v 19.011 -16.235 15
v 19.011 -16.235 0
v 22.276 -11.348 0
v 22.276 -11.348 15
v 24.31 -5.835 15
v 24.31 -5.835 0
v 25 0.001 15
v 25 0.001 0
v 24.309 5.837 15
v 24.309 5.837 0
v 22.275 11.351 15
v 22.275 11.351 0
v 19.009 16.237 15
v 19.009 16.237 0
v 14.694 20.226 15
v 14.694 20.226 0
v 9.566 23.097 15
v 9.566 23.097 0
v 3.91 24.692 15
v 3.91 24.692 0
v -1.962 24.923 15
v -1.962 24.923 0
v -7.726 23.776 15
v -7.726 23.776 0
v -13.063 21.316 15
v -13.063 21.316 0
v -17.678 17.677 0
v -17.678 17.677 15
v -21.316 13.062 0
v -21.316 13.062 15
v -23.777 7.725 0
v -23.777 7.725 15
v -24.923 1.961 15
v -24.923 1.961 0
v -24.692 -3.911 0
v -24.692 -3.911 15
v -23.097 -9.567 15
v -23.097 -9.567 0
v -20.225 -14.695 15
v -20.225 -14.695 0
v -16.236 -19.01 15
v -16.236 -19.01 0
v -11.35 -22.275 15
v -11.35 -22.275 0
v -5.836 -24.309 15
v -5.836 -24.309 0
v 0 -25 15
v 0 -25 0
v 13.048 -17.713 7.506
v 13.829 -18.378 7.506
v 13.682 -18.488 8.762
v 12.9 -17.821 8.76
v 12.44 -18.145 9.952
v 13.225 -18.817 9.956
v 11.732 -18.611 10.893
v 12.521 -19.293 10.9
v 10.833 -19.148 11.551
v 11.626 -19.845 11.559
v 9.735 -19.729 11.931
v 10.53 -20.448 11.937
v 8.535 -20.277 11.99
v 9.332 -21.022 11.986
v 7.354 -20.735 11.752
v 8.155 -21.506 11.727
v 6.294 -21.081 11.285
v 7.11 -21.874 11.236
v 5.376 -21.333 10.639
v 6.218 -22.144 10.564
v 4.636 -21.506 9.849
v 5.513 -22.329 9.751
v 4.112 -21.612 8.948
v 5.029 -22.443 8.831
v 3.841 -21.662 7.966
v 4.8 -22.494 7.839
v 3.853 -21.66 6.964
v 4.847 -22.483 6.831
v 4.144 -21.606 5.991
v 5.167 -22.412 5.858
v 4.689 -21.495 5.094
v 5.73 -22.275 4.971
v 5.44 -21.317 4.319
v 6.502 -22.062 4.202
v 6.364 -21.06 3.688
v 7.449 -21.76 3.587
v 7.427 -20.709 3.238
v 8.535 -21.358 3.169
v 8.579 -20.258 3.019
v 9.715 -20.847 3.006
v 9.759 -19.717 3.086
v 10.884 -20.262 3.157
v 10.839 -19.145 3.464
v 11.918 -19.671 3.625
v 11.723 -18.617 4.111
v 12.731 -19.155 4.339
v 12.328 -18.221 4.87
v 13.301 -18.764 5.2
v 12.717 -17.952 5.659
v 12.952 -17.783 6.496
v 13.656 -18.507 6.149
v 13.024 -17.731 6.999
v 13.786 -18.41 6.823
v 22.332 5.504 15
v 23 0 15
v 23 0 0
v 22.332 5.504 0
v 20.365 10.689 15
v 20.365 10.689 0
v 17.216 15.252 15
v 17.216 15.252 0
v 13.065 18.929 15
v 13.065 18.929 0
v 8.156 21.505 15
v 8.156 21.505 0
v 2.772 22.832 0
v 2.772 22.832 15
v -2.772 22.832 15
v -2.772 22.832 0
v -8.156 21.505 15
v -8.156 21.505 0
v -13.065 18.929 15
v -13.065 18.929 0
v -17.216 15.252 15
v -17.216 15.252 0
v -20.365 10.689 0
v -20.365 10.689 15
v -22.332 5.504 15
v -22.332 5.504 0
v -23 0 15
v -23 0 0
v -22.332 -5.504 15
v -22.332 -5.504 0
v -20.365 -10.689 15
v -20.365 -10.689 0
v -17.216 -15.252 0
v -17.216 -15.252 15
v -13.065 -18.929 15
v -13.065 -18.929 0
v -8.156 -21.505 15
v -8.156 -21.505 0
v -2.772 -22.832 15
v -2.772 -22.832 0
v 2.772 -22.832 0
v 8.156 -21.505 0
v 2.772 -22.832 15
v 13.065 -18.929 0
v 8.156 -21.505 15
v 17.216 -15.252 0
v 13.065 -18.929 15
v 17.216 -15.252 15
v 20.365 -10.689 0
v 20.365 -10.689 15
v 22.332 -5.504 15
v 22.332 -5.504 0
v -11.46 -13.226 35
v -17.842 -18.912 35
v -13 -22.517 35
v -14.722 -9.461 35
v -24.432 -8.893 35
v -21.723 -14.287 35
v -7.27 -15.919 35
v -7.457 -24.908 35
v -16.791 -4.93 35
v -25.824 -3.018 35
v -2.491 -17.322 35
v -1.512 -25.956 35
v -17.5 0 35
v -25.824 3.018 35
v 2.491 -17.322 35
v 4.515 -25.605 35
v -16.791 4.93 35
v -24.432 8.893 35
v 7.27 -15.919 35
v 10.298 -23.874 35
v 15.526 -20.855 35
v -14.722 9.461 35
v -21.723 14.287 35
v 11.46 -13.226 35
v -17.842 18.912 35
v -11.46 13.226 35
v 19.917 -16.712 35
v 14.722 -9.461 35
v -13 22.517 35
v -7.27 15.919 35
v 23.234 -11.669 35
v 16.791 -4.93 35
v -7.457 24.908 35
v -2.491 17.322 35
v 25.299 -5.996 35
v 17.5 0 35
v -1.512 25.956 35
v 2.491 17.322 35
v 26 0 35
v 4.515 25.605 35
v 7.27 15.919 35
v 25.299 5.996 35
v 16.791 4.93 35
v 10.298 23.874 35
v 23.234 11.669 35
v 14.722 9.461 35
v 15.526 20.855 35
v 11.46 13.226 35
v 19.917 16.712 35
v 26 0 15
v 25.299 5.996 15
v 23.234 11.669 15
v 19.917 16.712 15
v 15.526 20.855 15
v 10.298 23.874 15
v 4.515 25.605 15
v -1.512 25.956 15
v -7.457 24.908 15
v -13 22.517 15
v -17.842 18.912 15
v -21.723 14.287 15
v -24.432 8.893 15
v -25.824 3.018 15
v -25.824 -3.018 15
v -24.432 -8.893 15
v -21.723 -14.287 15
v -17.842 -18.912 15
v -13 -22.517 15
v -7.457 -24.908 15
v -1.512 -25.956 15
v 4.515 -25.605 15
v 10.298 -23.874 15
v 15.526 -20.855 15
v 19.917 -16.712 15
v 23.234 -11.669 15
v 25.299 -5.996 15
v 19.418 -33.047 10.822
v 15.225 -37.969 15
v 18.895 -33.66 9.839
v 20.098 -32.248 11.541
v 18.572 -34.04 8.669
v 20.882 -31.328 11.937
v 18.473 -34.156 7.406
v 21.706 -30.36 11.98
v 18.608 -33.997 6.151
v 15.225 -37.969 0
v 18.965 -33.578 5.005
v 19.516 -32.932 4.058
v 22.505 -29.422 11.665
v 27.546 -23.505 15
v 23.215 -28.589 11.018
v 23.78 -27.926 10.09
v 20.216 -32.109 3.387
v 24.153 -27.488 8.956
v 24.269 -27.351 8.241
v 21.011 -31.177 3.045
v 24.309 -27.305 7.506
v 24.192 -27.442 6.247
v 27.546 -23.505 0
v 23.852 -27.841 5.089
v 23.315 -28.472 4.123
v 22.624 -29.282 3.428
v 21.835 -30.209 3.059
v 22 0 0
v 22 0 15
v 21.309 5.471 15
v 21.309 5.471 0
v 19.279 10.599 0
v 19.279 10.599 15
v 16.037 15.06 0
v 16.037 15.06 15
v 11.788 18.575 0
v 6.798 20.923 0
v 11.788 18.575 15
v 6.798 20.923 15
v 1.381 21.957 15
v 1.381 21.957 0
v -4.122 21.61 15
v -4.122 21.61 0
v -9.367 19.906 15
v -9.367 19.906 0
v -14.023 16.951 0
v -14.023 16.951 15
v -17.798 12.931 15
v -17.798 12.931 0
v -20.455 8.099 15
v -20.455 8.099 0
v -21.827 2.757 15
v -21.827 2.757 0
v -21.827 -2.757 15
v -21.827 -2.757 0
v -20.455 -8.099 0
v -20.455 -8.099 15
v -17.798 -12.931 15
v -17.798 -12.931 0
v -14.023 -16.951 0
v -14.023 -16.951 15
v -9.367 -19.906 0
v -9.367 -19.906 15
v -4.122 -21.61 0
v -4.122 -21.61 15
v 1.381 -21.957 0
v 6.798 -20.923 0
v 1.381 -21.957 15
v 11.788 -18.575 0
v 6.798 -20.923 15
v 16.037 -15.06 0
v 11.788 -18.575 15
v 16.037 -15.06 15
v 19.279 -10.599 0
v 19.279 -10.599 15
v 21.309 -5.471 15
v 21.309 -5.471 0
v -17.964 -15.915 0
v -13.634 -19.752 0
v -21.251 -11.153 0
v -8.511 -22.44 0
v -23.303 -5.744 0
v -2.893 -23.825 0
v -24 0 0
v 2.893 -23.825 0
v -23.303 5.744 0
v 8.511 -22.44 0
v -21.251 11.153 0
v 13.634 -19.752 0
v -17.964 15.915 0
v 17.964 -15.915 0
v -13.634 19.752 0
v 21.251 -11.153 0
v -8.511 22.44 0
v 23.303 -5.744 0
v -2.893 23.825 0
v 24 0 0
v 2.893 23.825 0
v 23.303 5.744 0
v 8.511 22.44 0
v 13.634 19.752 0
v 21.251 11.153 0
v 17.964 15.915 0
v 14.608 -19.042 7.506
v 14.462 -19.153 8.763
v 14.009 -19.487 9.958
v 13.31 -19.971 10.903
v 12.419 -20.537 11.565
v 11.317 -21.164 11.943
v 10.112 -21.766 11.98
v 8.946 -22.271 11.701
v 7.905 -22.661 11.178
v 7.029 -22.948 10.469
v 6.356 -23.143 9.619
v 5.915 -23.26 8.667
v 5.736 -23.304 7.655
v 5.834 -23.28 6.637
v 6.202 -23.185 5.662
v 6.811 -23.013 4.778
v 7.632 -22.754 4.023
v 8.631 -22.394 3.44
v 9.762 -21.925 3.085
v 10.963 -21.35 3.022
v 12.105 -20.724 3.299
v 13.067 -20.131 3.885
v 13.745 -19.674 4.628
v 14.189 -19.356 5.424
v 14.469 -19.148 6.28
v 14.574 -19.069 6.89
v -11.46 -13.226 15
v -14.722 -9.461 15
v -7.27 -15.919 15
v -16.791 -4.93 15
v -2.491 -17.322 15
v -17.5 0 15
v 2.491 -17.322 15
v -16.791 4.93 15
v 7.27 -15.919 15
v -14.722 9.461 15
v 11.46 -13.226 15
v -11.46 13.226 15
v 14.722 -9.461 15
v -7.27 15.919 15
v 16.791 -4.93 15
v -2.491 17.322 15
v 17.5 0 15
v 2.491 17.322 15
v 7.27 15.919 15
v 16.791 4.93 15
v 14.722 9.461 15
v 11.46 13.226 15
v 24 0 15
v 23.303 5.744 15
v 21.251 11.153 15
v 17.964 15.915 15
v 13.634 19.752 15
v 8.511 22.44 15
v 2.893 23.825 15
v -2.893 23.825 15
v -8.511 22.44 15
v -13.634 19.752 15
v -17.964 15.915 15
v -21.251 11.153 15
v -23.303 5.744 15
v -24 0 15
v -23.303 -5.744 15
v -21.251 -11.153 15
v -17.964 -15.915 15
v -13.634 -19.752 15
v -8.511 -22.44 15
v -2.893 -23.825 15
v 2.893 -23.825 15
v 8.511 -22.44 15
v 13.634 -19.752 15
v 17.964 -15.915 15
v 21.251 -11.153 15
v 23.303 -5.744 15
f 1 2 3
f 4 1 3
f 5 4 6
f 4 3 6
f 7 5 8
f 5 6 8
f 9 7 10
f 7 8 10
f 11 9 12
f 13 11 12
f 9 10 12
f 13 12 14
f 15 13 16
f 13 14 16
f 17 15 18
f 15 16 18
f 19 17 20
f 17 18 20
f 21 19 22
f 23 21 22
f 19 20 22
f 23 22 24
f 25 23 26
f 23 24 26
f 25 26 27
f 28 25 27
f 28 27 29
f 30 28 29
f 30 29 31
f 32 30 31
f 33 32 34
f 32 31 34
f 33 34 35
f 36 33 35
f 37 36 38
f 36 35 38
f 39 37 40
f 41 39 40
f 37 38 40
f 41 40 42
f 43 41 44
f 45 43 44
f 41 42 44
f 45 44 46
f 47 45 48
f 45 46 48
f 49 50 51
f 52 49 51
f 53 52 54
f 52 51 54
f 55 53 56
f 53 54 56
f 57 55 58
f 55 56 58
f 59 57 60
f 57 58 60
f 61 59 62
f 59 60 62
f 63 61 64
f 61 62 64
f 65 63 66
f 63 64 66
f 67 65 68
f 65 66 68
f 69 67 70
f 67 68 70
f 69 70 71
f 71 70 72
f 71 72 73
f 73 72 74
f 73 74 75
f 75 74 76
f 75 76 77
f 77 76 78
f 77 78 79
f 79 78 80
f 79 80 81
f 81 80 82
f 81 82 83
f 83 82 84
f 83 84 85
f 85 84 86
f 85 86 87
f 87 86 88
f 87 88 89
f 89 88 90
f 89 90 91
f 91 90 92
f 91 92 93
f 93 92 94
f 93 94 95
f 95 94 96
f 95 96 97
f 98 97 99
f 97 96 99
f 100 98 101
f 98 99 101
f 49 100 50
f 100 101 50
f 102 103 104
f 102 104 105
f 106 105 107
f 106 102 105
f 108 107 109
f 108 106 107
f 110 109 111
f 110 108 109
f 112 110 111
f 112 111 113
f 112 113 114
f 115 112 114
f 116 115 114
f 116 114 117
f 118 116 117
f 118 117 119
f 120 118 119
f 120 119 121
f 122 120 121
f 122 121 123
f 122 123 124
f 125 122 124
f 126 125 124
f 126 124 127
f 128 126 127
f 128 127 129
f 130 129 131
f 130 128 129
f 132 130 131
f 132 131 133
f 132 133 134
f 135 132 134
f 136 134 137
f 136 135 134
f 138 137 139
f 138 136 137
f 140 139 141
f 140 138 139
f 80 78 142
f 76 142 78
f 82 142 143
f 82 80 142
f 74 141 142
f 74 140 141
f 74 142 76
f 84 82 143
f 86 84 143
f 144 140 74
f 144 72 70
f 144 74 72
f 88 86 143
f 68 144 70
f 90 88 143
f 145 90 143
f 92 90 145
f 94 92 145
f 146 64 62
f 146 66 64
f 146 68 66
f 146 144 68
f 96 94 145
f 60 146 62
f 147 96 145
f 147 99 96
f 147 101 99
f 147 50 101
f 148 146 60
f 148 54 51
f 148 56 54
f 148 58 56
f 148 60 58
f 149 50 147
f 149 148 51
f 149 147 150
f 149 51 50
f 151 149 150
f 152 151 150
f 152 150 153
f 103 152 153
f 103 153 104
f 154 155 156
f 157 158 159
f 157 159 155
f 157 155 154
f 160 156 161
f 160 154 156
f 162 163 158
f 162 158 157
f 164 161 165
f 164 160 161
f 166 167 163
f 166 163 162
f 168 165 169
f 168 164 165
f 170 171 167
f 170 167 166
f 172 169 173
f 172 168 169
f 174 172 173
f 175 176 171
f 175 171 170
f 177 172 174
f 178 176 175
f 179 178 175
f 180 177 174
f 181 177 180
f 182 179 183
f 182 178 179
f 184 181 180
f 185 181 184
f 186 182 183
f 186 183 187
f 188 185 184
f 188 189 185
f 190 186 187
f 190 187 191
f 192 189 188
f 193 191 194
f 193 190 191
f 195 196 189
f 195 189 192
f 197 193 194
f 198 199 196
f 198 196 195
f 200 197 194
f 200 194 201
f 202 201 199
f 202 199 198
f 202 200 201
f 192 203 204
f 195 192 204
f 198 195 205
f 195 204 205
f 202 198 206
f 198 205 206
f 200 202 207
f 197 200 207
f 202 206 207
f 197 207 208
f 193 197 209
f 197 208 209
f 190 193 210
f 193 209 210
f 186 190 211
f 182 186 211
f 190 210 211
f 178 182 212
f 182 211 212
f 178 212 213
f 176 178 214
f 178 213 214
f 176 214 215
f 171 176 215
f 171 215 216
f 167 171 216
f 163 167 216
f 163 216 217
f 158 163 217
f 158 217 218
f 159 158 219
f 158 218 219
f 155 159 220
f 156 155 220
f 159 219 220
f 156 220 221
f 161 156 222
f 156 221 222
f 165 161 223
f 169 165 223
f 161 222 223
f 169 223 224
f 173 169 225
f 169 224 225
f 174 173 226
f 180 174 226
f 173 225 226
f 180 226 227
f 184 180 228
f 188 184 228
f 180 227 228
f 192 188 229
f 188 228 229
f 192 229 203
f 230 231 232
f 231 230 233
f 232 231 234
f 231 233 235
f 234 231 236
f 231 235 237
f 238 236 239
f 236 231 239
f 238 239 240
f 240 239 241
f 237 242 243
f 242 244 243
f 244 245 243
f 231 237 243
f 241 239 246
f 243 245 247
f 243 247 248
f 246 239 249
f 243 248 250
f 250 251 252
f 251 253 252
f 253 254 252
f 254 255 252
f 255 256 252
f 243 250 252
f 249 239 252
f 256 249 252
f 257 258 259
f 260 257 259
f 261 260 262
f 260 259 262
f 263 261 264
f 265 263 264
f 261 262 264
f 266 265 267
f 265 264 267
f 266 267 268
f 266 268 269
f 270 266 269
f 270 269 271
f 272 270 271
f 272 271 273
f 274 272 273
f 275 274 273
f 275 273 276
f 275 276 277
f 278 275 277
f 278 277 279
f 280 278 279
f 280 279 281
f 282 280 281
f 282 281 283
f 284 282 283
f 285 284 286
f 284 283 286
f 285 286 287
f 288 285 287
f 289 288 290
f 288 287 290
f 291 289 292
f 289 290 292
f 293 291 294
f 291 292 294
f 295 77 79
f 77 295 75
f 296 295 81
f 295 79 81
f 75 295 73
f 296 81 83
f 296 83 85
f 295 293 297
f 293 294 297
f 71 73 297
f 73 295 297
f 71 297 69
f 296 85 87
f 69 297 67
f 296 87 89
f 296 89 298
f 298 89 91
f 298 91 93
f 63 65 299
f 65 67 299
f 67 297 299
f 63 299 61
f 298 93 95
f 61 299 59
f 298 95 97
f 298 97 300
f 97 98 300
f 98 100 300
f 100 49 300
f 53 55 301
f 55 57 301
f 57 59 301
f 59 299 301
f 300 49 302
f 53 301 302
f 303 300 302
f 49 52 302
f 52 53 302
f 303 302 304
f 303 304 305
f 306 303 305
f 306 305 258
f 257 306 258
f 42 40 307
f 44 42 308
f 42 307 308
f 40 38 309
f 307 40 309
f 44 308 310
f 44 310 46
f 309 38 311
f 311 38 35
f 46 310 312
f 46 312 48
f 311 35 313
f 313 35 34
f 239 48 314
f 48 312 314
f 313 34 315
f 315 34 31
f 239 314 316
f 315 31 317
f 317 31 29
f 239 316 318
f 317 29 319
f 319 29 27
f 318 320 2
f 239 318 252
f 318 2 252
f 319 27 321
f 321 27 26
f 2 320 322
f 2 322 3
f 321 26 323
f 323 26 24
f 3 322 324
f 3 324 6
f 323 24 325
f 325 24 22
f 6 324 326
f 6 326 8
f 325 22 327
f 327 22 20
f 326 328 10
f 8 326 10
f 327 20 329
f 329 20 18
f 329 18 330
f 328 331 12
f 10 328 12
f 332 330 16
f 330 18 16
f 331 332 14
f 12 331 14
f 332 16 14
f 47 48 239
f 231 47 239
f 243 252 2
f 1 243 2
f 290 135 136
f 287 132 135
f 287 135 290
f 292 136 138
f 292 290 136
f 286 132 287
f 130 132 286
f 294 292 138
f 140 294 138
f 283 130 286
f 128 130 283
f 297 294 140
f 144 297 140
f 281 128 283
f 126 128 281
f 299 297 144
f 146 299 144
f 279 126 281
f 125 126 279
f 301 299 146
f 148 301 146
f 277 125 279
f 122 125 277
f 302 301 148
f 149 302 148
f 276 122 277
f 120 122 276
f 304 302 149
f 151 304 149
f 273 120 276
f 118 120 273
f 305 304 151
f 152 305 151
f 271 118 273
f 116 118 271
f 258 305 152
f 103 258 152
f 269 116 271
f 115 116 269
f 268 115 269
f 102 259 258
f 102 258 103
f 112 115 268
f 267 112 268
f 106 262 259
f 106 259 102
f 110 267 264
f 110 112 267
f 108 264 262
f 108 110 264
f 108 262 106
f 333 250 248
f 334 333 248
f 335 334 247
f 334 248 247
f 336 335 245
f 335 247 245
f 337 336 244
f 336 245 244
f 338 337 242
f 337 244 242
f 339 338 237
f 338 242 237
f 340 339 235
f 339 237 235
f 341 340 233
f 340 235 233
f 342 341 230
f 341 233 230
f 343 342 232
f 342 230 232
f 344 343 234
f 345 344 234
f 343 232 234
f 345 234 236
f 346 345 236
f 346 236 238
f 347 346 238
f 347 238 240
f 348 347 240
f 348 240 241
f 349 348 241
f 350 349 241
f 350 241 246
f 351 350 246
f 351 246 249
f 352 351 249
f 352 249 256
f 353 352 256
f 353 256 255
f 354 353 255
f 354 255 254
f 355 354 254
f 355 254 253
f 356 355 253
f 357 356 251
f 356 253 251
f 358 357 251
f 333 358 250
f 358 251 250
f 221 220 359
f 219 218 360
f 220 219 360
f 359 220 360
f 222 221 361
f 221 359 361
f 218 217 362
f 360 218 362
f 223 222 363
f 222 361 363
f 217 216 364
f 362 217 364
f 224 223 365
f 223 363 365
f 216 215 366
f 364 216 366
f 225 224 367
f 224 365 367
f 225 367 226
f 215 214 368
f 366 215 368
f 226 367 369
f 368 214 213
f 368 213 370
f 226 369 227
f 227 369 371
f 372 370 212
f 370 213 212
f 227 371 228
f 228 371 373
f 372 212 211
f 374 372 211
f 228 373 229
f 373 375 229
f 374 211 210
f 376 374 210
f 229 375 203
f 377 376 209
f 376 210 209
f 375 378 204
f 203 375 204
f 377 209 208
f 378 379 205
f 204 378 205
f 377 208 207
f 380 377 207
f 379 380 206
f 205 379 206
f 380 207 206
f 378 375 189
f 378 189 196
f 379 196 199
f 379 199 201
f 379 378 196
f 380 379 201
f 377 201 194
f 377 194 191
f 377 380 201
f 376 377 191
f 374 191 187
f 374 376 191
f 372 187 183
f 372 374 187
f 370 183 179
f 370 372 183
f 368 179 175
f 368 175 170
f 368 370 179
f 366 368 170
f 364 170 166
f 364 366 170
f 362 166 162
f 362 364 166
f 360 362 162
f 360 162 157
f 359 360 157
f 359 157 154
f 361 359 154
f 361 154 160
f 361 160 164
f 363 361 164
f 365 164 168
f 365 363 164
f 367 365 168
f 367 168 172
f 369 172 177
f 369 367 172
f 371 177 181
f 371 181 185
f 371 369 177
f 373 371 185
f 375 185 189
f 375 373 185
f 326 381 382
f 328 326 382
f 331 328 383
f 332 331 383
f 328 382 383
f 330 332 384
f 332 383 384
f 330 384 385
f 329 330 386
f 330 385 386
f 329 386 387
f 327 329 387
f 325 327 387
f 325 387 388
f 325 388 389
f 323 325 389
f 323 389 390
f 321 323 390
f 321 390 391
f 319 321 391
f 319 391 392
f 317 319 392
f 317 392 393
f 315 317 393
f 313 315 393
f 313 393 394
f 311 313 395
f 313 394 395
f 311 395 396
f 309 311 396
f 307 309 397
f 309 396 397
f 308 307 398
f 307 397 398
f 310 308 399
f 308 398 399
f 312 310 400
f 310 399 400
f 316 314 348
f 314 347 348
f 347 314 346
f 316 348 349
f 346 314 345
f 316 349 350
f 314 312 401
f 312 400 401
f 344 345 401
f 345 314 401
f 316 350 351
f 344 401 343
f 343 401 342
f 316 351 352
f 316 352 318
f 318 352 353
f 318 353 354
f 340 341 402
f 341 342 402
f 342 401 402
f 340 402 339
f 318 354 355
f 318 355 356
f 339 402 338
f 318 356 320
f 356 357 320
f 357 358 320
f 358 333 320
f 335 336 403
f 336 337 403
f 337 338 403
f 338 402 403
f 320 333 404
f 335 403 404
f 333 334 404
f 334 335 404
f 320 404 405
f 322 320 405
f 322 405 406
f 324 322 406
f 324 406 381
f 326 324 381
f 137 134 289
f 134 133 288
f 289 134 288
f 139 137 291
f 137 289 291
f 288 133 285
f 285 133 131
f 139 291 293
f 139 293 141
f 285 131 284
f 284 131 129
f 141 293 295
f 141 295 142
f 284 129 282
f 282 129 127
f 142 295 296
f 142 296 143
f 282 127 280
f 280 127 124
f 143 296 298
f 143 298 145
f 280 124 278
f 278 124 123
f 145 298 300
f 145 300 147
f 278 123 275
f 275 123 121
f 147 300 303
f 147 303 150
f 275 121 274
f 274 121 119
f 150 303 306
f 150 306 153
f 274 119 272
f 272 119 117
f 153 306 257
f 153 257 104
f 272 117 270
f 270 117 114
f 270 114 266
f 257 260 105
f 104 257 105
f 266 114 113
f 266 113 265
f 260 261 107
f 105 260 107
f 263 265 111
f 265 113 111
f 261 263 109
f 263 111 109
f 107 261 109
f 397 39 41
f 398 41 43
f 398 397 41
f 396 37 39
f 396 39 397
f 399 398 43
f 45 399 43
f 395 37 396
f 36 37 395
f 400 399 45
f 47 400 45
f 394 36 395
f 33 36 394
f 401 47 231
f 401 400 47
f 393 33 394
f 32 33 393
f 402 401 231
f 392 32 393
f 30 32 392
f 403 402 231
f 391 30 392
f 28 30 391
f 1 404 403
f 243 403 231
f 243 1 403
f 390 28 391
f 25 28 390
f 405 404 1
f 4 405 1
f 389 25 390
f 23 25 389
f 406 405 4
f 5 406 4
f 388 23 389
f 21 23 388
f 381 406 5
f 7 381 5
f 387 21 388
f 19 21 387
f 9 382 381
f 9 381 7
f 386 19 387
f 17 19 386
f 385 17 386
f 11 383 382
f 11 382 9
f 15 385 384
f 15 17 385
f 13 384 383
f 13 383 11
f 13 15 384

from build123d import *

# Parameters (mm, degrees)
F1_DEPTH  = 15
F2_R      = 4.5
F3_DEPTH  = 20
F4_R      = 22
F5_DEPTH  = 15
F6_R      = 24
F6_R_2    = 23
F7_DEPTH  = 15
F9_R      = 26
F9_R_2    = 17.5
F10_DEPTH = 20


with BuildPart() as f1:
    # F0 (on Top) → F1 (new body)
    with BuildSketch(Plane.XY):
        with BuildLine():
            Line((27.54567, -23.504654), (19.011129, -16.235053))
            ThreePointArc((19.011129, -16.235053), (-10.467179, 22.703263), (0, -25))
            Line((0, -25), (15.225361, -37.968747))
            Line((15.225361, -37.968747), (27.54567, -23.504654))
        make_face()
    extrude(amount=F1_DEPTH)

    # F2 (on face) → F3 (cut)
    with BuildSketch(Plane(origin=(27.566226, -23.480522, 0), x_dir=(0.648437, 0.761268, 0), z_dir=(0.761268, -0.648437, 0))):
        with Locations((-9.523782, 7.506252)):
            Circle(F2_R)
    extrude(amount=-F3_DEPTH, mode=Mode.SUBTRACT)

    # F4 (on face) → F5 (cut)
    with BuildSketch(Plane.XY.offset(15)):
        Circle(F4_R)
    extrude(amount=-F5_DEPTH, mode=Mode.SUBTRACT)

    # F6 (on face) → F7 (cut)
    with BuildSketch(Plane.XY.offset(15)):
        Circle(F6_R)
        Circle(F6_R_2, mode=Mode.SUBTRACT)
    extrude(amount=-F7_DEPTH, mode=Mode.SUBTRACT)


with BuildPart() as f10:
    # F9 (on offset) → F10 (new body)
    with BuildSketch(Plane.XY.offset(15)):
        Circle(F9_R)
        Circle(F9_R_2, mode=Mode.SUBTRACT)
    extrude(amount=F10_DEPTH)


solid = Compound([f1.part, f10.part])
